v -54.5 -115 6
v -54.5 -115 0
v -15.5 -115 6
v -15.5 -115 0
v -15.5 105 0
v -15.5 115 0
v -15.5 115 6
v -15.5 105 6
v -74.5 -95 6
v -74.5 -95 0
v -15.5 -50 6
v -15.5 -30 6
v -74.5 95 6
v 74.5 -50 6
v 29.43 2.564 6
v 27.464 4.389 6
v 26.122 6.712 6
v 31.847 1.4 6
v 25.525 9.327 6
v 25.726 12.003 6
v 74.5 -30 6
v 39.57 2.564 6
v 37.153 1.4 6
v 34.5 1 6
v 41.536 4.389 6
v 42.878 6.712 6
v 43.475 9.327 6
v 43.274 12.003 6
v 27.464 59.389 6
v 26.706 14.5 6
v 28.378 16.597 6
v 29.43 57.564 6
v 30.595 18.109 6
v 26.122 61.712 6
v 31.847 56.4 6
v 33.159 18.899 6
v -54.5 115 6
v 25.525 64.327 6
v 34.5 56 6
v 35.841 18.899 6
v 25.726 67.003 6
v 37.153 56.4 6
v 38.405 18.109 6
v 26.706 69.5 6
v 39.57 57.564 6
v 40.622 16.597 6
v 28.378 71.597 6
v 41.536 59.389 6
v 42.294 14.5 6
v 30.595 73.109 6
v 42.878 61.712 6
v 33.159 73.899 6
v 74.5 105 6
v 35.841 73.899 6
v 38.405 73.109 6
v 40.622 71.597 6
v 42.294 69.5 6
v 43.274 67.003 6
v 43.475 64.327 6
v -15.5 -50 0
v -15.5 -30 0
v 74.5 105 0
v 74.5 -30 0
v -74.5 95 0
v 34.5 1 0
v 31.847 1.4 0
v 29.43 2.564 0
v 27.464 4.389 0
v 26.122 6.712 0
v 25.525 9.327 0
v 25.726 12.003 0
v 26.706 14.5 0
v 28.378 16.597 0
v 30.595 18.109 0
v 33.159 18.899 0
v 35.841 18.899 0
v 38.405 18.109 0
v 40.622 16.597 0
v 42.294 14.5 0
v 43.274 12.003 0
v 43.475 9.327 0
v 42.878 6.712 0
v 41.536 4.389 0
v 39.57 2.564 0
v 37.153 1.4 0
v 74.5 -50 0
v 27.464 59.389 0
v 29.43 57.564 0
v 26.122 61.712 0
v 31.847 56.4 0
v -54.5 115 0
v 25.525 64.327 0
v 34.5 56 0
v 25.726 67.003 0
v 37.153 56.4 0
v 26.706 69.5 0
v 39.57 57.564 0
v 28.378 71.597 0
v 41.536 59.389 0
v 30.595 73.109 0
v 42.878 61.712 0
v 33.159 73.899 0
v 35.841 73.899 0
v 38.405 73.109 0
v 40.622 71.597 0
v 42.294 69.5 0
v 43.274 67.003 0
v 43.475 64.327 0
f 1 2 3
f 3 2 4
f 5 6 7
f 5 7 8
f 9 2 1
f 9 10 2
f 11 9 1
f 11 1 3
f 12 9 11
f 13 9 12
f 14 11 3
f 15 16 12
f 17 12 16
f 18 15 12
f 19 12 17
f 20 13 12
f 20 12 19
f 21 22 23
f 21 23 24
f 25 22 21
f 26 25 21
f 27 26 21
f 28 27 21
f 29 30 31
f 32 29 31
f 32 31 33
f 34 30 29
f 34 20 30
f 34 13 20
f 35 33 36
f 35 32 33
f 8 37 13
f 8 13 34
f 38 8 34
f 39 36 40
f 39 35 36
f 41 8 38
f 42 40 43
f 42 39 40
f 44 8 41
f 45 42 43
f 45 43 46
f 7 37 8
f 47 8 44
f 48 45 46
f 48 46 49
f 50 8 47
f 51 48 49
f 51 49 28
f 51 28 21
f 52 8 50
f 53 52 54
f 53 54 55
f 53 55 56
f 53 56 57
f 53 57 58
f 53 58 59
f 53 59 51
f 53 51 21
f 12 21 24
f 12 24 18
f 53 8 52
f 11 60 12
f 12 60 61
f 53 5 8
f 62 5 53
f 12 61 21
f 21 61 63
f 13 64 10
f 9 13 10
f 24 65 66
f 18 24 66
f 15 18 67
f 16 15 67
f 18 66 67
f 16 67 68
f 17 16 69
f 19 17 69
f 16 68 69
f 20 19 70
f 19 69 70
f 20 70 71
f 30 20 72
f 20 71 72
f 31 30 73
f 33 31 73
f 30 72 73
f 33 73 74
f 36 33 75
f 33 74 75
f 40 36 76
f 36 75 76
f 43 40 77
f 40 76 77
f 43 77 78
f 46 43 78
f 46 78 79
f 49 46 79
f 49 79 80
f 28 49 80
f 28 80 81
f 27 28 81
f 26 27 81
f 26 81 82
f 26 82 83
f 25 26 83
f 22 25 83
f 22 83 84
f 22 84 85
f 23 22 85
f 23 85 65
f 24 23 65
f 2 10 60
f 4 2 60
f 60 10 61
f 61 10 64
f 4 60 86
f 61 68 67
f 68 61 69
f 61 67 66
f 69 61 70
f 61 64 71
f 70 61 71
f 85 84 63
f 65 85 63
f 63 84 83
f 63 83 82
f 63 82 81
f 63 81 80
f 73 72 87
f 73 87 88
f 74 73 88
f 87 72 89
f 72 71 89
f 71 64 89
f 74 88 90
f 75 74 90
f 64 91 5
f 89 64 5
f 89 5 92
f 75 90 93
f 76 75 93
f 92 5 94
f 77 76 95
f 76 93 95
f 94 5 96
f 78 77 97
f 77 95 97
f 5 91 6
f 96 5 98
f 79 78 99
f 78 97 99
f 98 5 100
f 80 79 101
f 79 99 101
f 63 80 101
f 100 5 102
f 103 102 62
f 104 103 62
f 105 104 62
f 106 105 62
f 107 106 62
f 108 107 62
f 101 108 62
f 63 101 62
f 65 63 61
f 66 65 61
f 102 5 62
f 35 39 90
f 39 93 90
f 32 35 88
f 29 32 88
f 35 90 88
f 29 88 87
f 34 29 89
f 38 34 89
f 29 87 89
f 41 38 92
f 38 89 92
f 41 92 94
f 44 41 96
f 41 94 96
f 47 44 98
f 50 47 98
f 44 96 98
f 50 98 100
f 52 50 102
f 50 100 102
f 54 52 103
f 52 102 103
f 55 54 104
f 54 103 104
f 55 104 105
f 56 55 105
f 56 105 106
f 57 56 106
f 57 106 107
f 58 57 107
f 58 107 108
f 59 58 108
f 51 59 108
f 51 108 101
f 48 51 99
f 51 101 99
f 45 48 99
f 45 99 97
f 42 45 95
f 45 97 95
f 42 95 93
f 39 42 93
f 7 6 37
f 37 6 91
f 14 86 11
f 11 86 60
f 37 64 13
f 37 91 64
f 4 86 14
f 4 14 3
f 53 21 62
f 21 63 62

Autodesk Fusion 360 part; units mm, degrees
sketch "スケッチ1" plane through (0, 0, 0) normal (0, 0, 1) x (1, 0, 0)
  line L0 (-15.5, 115) -> (-74.5, 115)
  line L1 (-74.5, 115) -> (-74.5, -115)
  line L2 (-74.5, -115) -> (-15.5, -115)
  line L3 (74.5, -30) -> (74.5, 105)
  line L4 (68.0217, 105) -> (-74.5, -115) construction
  line L5 (-74.5, 115) -> (45.8131, -70.7183) construction
  line L6 (-15.5, 115) -> (-15.5, 105)
  line L7 (-15.5, 105) -> (74.5, 105)
  line L8 (-74.5, -115) -> (-15.5, -115) construction
  line L9 (74.5, -50) -> (-15.5, -115)
  line L10 (74.5, -50) -> (-15.5, -50)
  line L11 (-15.5, -50) -> (-15.5, -30)
  line L12 (-15.5, -30) -> (74.5, -30)
  dimension "d2" = 230
  dimension "d5" = 59
  dimension "d7" = 90
  dimension "d8" = 20
extrude "押し出し1" add sketch "スケッチ1" along normal blind 6
chamfer "面取り1" distance 20 angle 45 2 edges at (-74.5, -115, 3) (-74.5, 115, 3)
sketch "スケッチ2" plane through (0, 0, 6) normal (0, 0, 1) x (-1, 0, 0)
  line L0 (54.5, -115) -> (74.5, -95)
  line L1 (74.5, -95) -> (74.5, 95)
  line L2 (74.5, 95) -> (54.5, 115)
  line L3 (54.5, 115) -> (15.5, 115)
  line L4 (15.5, 115) -> (-74.5, 50)
  line L5 (-74.5, 50) -> (15.5, 50)
  line L6 (15.5, 50) -> (15.5, 30)
  line L7 (15.5, 30) -> (-74.5, 30)
  line L8 (-74.5, 30) -> (-74.5, -105)
  line L9 (-74.5, -105) -> (15.5, -105)
  line L10 (15.5, -105) -> (15.5, -115)
  line L11 (15.5, -115) -> (54.5, -115)
  line L12 (-74.5, -105) -> (-34.5, -105) construction
  line L13 (-34.5, -105) -> (-34.5, -65) construction
  line L14 (-34.5, -65) -> (-74.5, -65) construction
  line L15 (-74.5, -65) -> (-74.5, -105) construction
  line L16 (-34.5, -65) -> (-34.5, -10) construction
  point P0 (-34.5, -65)
  point P1 (-34.5, -10)
  dimension "d12" = 40
  dimension "d13" = 40
  dimension "d14" = 55
hole "穴1" at (34.5, 65, 6) at (34.5, 10, 6) direction (0, 0, -1) diameter 18 end through all
equation "d5 = 20 mm + 39 mm"
